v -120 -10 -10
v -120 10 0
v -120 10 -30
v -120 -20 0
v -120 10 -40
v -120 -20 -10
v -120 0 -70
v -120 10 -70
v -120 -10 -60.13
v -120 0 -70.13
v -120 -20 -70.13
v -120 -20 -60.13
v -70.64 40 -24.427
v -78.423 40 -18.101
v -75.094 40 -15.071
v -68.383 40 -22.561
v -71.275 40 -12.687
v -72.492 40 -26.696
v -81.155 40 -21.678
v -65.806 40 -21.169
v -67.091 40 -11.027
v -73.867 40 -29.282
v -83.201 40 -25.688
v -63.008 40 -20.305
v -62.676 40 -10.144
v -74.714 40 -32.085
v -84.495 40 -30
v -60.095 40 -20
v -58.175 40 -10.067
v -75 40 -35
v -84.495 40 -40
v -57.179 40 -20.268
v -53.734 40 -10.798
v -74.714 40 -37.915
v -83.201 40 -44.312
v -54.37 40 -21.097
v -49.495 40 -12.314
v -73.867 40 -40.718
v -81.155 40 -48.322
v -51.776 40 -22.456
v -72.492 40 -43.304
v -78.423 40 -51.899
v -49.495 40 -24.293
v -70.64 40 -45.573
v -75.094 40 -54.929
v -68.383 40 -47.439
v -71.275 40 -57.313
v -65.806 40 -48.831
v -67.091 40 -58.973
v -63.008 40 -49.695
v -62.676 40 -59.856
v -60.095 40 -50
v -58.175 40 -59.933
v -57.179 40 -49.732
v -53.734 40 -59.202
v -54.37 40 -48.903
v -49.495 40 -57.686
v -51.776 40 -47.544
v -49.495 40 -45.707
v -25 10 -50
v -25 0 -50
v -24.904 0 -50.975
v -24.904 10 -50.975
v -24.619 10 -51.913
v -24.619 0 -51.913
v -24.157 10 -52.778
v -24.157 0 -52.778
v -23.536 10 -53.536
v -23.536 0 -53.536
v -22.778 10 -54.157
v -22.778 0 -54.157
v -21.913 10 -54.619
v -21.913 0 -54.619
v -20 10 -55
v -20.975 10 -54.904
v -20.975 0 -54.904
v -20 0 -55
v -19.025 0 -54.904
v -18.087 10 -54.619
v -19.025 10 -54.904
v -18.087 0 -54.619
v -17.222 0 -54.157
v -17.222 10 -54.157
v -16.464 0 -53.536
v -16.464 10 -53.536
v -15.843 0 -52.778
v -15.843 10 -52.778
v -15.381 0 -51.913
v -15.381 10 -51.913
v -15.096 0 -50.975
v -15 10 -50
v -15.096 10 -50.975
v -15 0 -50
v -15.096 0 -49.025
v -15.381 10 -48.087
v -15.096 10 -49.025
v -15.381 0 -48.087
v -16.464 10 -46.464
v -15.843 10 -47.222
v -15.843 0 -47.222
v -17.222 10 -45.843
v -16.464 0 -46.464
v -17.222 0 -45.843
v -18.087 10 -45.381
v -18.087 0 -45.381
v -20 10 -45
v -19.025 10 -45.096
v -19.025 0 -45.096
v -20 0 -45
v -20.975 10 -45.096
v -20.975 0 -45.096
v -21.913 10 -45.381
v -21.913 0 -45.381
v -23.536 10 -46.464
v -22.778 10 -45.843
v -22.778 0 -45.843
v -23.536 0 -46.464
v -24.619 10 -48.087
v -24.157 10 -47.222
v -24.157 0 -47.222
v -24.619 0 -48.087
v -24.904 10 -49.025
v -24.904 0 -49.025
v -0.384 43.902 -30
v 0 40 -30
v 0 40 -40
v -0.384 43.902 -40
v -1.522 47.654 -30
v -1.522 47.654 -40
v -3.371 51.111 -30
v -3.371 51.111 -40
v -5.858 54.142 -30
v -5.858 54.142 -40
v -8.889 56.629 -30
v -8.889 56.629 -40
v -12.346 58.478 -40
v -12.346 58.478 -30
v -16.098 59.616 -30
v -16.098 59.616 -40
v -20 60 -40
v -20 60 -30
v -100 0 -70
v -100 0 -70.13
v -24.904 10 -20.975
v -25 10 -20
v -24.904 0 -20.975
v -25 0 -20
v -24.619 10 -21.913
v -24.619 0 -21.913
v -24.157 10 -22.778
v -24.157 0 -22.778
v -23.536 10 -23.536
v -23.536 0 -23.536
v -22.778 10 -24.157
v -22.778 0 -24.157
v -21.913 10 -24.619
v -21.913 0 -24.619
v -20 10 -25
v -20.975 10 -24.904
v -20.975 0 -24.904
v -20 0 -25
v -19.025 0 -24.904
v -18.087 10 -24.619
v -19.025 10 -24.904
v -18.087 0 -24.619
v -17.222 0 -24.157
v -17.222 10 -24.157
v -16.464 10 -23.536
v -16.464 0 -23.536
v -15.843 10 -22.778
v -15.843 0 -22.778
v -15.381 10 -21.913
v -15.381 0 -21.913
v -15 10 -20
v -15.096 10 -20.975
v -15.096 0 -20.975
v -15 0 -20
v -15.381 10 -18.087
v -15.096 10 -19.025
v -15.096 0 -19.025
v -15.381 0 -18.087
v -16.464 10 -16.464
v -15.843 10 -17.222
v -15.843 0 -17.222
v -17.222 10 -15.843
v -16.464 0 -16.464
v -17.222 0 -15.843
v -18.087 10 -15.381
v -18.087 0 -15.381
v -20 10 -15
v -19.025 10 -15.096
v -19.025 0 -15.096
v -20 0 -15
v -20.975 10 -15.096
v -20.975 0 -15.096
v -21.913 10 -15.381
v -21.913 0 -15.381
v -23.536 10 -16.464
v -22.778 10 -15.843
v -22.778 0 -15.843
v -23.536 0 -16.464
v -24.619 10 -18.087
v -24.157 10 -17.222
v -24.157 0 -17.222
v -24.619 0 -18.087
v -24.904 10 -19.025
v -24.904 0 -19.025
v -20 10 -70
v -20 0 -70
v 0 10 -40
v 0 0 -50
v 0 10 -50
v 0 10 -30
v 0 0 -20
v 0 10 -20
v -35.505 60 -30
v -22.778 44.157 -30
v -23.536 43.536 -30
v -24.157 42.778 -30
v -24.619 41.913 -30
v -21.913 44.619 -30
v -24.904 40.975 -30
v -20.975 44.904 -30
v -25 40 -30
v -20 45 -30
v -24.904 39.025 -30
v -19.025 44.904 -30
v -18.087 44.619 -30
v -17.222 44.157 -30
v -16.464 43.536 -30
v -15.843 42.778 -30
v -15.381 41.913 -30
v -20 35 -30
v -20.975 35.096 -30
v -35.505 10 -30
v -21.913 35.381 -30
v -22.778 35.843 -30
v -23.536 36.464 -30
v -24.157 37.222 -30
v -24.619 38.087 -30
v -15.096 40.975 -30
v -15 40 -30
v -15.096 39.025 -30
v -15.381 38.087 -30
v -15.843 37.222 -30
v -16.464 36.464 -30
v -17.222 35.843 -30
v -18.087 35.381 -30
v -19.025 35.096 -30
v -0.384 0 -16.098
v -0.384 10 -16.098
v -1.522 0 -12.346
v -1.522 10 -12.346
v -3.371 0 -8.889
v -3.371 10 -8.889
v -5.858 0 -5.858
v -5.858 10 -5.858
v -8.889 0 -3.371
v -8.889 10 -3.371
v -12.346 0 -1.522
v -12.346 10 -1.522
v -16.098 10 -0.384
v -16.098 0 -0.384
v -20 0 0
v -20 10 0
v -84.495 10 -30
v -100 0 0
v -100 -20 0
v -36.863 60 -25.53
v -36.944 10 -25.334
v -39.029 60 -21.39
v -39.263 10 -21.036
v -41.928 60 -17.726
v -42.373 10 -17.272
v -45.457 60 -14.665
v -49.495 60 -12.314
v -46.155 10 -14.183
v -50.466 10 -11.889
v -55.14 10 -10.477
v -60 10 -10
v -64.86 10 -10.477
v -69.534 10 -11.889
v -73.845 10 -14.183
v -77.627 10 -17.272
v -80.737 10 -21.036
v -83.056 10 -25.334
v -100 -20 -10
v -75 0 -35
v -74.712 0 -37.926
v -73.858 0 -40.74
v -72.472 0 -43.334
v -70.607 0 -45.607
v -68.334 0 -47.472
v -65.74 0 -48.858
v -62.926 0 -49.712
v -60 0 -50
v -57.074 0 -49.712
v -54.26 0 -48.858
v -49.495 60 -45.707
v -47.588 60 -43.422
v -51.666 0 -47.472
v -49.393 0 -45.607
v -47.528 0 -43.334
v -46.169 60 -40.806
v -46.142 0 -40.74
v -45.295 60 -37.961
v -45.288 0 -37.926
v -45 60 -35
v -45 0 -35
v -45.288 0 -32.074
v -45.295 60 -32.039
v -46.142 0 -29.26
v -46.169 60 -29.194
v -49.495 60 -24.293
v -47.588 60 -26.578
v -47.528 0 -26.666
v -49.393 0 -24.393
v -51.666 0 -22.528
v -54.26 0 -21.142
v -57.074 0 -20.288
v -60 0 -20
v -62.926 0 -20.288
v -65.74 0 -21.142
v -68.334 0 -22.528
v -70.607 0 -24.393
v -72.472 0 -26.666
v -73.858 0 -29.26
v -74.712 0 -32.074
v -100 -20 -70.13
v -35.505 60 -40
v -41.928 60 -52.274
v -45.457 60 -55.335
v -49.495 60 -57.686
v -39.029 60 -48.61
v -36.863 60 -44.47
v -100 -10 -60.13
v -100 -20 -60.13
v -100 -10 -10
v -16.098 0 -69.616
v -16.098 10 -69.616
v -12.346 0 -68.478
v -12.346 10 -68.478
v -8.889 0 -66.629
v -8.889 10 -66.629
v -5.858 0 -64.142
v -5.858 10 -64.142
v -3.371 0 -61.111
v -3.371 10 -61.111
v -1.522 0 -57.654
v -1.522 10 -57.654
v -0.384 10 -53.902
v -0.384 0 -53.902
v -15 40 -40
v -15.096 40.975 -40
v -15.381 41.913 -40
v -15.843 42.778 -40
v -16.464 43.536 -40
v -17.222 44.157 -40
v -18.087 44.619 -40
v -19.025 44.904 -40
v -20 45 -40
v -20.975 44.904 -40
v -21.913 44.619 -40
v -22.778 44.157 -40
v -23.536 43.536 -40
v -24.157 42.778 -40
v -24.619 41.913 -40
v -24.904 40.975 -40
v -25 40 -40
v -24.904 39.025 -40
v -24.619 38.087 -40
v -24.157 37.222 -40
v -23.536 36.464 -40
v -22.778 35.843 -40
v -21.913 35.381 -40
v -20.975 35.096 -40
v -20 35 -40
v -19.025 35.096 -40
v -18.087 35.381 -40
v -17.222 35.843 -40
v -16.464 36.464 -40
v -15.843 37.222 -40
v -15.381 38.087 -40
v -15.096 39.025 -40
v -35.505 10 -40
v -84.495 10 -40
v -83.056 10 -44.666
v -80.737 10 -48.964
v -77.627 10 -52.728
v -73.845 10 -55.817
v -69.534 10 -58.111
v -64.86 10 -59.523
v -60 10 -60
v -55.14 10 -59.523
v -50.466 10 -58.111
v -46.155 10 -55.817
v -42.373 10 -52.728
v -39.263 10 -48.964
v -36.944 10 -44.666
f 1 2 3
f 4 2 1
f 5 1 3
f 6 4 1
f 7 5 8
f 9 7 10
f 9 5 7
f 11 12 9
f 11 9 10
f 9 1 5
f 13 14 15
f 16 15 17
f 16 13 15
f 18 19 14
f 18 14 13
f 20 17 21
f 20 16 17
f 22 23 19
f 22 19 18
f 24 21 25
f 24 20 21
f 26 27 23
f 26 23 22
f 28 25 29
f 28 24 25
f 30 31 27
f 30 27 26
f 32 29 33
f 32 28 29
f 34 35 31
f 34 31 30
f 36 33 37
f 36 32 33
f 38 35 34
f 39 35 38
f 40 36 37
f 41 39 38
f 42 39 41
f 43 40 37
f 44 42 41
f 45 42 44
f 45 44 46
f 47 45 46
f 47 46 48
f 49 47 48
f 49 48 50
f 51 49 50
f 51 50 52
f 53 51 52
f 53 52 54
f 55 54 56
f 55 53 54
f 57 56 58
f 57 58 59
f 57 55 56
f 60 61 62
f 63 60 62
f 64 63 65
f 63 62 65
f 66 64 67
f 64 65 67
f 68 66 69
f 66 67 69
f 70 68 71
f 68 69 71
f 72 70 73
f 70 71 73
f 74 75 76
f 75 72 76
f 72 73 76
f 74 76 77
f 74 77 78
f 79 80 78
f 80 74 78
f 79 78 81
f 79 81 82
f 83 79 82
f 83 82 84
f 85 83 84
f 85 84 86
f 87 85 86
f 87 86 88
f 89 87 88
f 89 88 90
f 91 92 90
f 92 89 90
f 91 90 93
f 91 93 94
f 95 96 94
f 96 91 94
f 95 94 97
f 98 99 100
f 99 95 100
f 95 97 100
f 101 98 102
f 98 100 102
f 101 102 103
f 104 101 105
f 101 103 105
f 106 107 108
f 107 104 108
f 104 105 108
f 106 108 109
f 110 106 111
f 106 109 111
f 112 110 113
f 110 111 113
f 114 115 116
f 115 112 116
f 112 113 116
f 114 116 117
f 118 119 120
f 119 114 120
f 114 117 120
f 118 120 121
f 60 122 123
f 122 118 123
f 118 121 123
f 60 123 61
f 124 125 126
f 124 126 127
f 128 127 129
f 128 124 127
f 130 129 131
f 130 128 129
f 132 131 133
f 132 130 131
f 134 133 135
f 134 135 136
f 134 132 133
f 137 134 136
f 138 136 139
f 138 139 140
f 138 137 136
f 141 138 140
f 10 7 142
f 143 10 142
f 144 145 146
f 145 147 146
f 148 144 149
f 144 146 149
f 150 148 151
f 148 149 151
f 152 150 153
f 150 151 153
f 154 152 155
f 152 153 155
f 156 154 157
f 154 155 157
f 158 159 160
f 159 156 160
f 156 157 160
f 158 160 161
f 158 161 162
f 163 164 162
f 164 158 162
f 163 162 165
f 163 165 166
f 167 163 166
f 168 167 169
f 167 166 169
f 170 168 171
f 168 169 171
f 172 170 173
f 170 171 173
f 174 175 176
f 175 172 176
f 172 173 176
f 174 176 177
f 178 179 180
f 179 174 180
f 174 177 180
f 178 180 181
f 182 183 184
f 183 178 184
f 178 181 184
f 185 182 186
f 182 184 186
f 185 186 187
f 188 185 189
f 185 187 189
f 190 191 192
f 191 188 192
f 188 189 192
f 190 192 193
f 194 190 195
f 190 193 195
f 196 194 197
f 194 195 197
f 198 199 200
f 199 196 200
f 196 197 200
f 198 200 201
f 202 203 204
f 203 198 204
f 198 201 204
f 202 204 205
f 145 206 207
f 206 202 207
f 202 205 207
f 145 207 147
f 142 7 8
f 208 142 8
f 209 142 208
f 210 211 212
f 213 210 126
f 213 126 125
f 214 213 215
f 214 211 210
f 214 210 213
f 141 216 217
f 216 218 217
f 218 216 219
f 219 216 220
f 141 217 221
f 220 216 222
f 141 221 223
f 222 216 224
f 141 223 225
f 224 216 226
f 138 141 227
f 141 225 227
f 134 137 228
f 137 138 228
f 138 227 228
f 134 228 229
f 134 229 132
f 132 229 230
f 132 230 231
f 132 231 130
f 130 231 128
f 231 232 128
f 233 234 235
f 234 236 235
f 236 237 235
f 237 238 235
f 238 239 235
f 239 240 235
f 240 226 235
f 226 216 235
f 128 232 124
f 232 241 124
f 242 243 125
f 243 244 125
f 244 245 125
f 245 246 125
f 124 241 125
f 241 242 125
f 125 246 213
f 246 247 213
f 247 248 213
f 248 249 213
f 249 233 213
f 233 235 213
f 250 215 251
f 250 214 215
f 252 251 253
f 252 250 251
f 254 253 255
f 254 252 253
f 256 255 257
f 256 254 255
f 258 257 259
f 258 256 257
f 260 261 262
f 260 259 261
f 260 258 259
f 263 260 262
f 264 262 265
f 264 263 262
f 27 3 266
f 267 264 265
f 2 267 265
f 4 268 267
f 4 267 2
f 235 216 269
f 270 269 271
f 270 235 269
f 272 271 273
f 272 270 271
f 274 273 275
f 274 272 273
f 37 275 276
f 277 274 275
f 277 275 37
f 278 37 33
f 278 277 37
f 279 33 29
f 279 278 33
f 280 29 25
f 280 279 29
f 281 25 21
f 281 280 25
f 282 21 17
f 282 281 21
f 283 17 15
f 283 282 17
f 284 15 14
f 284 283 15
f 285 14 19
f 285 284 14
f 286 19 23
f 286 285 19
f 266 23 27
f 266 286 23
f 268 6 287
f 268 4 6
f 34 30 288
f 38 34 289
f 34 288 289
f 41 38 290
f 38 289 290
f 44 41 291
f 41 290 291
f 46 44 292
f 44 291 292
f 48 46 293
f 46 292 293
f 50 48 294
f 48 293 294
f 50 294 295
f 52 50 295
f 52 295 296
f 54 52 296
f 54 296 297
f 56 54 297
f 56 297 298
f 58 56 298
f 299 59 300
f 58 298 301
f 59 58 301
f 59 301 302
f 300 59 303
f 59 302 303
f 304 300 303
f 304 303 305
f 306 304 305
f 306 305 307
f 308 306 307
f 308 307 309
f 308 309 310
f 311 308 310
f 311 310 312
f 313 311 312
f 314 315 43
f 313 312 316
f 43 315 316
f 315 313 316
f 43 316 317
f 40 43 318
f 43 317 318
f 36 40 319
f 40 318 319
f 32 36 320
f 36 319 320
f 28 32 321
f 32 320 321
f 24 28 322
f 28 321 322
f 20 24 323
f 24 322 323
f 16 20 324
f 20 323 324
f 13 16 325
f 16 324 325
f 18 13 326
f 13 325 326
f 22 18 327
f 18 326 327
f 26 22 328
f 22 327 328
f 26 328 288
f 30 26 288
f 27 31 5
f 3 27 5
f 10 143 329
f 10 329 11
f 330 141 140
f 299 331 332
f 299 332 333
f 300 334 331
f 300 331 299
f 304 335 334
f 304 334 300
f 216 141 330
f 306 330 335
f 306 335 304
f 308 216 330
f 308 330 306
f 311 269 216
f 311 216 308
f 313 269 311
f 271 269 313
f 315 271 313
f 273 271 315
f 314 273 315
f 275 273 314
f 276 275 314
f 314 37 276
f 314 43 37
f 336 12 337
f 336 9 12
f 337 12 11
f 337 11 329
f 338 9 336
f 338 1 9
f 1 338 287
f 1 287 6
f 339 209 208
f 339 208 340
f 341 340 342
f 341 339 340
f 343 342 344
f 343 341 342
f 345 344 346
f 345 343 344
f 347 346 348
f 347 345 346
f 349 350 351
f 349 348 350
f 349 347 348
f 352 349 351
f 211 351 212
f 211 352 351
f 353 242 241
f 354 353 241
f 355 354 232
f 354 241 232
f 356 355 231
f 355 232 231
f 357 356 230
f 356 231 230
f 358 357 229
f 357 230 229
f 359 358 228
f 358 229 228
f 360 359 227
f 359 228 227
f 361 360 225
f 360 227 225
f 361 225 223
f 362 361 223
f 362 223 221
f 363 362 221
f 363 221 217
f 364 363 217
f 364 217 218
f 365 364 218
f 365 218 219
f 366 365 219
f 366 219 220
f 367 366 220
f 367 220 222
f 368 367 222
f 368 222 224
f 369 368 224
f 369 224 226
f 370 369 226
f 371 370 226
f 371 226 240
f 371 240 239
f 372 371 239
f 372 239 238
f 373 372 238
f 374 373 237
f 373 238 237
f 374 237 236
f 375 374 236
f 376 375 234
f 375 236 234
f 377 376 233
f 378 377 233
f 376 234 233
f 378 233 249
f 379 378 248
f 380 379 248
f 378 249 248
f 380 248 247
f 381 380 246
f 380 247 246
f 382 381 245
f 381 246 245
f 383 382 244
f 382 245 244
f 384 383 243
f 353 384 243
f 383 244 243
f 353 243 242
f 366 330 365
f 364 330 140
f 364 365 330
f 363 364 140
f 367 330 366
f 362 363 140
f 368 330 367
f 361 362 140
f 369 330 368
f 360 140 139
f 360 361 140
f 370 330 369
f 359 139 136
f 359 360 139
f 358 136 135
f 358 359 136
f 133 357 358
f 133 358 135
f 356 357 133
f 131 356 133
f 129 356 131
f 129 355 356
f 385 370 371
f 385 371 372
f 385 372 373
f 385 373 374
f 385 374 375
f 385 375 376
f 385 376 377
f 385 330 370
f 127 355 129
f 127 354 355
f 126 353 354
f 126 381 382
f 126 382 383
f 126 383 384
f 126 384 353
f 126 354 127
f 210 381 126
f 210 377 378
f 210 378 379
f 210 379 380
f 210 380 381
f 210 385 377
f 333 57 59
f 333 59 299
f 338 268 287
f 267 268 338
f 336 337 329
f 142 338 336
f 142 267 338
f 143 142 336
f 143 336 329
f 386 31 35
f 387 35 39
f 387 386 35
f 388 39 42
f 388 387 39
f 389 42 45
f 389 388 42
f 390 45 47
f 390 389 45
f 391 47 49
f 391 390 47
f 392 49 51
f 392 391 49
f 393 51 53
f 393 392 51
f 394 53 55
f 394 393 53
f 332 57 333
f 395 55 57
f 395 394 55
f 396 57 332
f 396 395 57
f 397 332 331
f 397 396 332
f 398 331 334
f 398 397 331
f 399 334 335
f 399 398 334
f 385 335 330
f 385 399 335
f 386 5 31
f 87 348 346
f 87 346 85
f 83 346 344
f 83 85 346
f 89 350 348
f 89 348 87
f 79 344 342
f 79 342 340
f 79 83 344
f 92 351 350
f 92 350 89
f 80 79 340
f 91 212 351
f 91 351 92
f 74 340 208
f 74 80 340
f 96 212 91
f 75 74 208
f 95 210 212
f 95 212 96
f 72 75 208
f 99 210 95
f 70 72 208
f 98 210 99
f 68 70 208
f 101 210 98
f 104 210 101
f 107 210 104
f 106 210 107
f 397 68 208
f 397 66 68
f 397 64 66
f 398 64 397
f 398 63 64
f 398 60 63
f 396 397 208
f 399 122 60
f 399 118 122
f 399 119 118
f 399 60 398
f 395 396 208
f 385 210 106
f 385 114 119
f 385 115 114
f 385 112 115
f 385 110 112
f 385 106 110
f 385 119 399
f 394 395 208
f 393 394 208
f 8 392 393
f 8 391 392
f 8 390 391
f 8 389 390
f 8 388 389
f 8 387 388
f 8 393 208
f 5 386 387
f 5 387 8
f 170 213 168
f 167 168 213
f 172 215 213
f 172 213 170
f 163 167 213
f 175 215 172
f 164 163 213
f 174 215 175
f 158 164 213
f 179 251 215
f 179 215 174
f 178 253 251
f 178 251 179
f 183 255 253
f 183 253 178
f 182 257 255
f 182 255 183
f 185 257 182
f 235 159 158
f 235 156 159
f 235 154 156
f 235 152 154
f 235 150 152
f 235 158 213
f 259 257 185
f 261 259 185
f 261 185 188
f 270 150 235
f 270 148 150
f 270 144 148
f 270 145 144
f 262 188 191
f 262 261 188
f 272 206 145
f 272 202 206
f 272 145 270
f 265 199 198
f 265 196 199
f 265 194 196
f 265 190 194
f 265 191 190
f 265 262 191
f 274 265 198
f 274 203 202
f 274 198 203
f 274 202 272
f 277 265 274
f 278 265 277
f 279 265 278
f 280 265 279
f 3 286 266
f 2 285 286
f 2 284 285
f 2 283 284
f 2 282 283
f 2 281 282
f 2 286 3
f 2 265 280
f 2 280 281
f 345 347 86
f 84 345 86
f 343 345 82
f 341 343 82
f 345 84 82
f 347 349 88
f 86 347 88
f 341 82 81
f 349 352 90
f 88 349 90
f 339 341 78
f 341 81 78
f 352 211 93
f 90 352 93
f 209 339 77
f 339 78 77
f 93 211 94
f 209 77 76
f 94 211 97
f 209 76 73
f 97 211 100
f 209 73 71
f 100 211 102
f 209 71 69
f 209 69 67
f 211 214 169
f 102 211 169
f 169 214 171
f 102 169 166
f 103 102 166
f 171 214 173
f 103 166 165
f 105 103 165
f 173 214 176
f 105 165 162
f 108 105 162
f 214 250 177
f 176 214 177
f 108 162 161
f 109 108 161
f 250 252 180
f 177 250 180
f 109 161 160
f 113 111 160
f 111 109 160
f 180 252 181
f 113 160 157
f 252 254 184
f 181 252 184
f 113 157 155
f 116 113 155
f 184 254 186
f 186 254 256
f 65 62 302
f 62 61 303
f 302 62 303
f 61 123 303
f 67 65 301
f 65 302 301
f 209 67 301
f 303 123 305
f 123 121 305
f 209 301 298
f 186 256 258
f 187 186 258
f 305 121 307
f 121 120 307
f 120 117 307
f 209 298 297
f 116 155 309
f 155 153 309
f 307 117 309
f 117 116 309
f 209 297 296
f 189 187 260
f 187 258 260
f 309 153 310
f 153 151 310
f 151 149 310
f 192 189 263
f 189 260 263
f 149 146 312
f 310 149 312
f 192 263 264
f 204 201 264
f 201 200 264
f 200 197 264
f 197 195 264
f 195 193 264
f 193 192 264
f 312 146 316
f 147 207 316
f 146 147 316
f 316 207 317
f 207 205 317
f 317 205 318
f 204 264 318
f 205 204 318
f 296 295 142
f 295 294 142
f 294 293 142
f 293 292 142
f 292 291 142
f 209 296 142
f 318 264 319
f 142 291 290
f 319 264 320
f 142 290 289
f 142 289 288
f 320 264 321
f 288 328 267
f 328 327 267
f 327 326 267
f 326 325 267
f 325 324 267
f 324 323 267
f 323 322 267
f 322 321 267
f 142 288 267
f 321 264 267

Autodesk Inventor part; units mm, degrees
ref_plane "YZ Plane" through (0, 0, 0) normal (1, 0, 0) x (0, 1, 0)
ref_plane "XZ Plane" through (0, 0, 0) normal (0, 1, 0) x (-1, 0, 0)
ref_plane "XY Plane" through (0, 0, 0) normal (0, 0, 1) x (1, 0, 0)
sketch "Boceto1" plane through (0, 0, 0) normal (0, 1, 0) x (-1, 0, 0)
  line L0 (20, 0) -> (120, 0)
  line L1 (120, 0) -> (120, -70)
  line L2 (120, -70) -> (20, -70)
  line L3 (0, -50) -> (0, -20)
  arc A0 (20, 0) -> (0, -20) centre (20, -20) ccw
  arc A1 (0, -50) -> (20, -70) centre (20, -50) ccw
  circle A2 centre (20, -20) radius 5
  circle A3 centre (20, -50) radius 5
  line L4 (120, -35) -> (60, -35)
  line L5 (120, -35) -> (180, -35) construction
  circle A4 centre (60, -35) radius 15
  circle A5 centre (60, -35) radius 25
  line L6 (120, -39.9519) -> (120, -29.9405)
  line L7 (120, -30) -> (155.5051, -30) construction
  line L8 (120, -40) -> (155.5051, -40) construction
  line L9 (120, -40) -> (84.4949, -40)
  line L10 (35.5051, -40) -> (0, -40)
  line L11 (120, -30) -> (84.4949, -30)
  line L12 (35.5051, -30) -> (0, -30)
  point P0 (0, 0)
  point P1 (0, -70)
  dimension "d0" = 120
  dimension "d1" = 70
  dimension "d2" = 20
  dimension "d3" = 20
  dimension "d4" = 10
  dimension "d5" = 10
  dimension "d6" = 60
  dimension "d7" = 180
  dimension "d8" = 30
  dimension "d9" = 50
extrude "Extrusión1" add sketch "Boceto1" along normal blind 10 contours L0 L1 L11 A5 L12 L3 A0 | L10 A5 L9 L1 L2 A1 L3
extrude "Extrusión2" add sketch "Boceto1" along normal blind 60 contours L12 A5 L10 L3 | L1 L4 A5 L11 | A5 | L1 L9 A5 L4
fillet "Empalme1" radius 20 1 edges at (0, 60, -35)
sketch "Boceto2" plane through (-120, 10, -30) normal (0, 0, 1) x (1, 0, 0)
  line L0 (35.5051, 0) -> (84.4949, 0) projected
  line L1 (35.5051, 0) -> (35.5051, 30)
  line L2 (0, 0) -> (100, 0) projected
  line L3 (35.5051, 30) -> (0, 0)
  line L4 (35.5051, 30) -> (70.5051, 30)
  line L5 (70.5051, 30) -> (70.5051, 50)
  line L6 (84.4949, 50) -> (35.5051, 50) projected
  line L7 (35.5051, 30) -> (35.5051, 50)
  line L8 (35.5051, 50) -> (0, 50)
  line L9 (0, 50) -> (0, 0)
  line L10 (70.5051, 30) -> (70.5051, 50)
  line L11 (84.4949, 50) -> (35.5051, 50) projected
  line L12 (35.5051, 50) -> (35.5051, 30)
  line L13 (0, 0) -> (35.5051, 30)
  line L14 (70.5051, 30) -> (35.5051, 30)
  line L15 (70.5051, 30) -> (70.5051, 50)
  line L16 (70.5051, 50) -> (0, 50)
  line L17 (0, 50) -> (0, 0)
  dimension "d17" = 30
  dimension "d18" = 35
  dimension "d19" = 20
extrude "Extrusión4" cut sketch "Boceto2" along normal mid plane 60 contours L7 L6 L5 L4 | L3 L9 L8 L7
sketch "Boceto3" plane through (-35.5051, 10, -30) normal (0, 0, 1) x (1, 0, 0)
  line L0 (35.5051, 0) -> (35.5051, 30) projected
  line L1 (35.5051, 0) -> (15.5051, 0) projected
  line L2 (35.5051, 0) -> (15.5051, 0)
  line L3 (15.5051, 0) -> (15.5051, 30)
  circle A0 centre (15.5051, 30) radius 5
  point P0 (35.5051, -10)
  dimension "d25" = 10
extrude "Extrusión5" cut sketch "Boceto3" against normal blind 60
sketch "Boceto4" plane through (0, 0, 0) normal (0, -1, 0) x (1, 0, 0)
  line L0 (-120, -30) -> (-120, 0) projected
  line L1 (-120, 0) -> (-100, 0)
  line L2 (-100, 0) -> (-100, -10)
  line L3 (-100, -10) -> (-120, -10)
  line L4 (-120, -10) -> (-120, 0)
  line L5 (-120, -60.1296) -> (-100, -60.1296)
  line L6 (-100, -60.1296) -> (-100, -70.1296)
  line L7 (-100, -70.1296) -> (-120, -70.1296)
  line L8 (-120, -70.1296) -> (-120, -60.1296)
  line L9 (-100, -10) -> (-100, -60.1296)
  line L10 (-120, -10) -> (-120, -60.1296)
  point P0 (0, 0)
  dimension "d28" = 20
  dimension "d29" = 10
  dimension "d30" = 20
  dimension "d31" = 10
extrude "Extrusión6" add sketch "Boceto4" along normal blind 10 contours L0 L3 L9 L5 L10
extrude "Extrusión7" add sketch "Boceto4" along normal blind 20 contours L0 L1 L2 L3 | L5 L6 L7 L8
